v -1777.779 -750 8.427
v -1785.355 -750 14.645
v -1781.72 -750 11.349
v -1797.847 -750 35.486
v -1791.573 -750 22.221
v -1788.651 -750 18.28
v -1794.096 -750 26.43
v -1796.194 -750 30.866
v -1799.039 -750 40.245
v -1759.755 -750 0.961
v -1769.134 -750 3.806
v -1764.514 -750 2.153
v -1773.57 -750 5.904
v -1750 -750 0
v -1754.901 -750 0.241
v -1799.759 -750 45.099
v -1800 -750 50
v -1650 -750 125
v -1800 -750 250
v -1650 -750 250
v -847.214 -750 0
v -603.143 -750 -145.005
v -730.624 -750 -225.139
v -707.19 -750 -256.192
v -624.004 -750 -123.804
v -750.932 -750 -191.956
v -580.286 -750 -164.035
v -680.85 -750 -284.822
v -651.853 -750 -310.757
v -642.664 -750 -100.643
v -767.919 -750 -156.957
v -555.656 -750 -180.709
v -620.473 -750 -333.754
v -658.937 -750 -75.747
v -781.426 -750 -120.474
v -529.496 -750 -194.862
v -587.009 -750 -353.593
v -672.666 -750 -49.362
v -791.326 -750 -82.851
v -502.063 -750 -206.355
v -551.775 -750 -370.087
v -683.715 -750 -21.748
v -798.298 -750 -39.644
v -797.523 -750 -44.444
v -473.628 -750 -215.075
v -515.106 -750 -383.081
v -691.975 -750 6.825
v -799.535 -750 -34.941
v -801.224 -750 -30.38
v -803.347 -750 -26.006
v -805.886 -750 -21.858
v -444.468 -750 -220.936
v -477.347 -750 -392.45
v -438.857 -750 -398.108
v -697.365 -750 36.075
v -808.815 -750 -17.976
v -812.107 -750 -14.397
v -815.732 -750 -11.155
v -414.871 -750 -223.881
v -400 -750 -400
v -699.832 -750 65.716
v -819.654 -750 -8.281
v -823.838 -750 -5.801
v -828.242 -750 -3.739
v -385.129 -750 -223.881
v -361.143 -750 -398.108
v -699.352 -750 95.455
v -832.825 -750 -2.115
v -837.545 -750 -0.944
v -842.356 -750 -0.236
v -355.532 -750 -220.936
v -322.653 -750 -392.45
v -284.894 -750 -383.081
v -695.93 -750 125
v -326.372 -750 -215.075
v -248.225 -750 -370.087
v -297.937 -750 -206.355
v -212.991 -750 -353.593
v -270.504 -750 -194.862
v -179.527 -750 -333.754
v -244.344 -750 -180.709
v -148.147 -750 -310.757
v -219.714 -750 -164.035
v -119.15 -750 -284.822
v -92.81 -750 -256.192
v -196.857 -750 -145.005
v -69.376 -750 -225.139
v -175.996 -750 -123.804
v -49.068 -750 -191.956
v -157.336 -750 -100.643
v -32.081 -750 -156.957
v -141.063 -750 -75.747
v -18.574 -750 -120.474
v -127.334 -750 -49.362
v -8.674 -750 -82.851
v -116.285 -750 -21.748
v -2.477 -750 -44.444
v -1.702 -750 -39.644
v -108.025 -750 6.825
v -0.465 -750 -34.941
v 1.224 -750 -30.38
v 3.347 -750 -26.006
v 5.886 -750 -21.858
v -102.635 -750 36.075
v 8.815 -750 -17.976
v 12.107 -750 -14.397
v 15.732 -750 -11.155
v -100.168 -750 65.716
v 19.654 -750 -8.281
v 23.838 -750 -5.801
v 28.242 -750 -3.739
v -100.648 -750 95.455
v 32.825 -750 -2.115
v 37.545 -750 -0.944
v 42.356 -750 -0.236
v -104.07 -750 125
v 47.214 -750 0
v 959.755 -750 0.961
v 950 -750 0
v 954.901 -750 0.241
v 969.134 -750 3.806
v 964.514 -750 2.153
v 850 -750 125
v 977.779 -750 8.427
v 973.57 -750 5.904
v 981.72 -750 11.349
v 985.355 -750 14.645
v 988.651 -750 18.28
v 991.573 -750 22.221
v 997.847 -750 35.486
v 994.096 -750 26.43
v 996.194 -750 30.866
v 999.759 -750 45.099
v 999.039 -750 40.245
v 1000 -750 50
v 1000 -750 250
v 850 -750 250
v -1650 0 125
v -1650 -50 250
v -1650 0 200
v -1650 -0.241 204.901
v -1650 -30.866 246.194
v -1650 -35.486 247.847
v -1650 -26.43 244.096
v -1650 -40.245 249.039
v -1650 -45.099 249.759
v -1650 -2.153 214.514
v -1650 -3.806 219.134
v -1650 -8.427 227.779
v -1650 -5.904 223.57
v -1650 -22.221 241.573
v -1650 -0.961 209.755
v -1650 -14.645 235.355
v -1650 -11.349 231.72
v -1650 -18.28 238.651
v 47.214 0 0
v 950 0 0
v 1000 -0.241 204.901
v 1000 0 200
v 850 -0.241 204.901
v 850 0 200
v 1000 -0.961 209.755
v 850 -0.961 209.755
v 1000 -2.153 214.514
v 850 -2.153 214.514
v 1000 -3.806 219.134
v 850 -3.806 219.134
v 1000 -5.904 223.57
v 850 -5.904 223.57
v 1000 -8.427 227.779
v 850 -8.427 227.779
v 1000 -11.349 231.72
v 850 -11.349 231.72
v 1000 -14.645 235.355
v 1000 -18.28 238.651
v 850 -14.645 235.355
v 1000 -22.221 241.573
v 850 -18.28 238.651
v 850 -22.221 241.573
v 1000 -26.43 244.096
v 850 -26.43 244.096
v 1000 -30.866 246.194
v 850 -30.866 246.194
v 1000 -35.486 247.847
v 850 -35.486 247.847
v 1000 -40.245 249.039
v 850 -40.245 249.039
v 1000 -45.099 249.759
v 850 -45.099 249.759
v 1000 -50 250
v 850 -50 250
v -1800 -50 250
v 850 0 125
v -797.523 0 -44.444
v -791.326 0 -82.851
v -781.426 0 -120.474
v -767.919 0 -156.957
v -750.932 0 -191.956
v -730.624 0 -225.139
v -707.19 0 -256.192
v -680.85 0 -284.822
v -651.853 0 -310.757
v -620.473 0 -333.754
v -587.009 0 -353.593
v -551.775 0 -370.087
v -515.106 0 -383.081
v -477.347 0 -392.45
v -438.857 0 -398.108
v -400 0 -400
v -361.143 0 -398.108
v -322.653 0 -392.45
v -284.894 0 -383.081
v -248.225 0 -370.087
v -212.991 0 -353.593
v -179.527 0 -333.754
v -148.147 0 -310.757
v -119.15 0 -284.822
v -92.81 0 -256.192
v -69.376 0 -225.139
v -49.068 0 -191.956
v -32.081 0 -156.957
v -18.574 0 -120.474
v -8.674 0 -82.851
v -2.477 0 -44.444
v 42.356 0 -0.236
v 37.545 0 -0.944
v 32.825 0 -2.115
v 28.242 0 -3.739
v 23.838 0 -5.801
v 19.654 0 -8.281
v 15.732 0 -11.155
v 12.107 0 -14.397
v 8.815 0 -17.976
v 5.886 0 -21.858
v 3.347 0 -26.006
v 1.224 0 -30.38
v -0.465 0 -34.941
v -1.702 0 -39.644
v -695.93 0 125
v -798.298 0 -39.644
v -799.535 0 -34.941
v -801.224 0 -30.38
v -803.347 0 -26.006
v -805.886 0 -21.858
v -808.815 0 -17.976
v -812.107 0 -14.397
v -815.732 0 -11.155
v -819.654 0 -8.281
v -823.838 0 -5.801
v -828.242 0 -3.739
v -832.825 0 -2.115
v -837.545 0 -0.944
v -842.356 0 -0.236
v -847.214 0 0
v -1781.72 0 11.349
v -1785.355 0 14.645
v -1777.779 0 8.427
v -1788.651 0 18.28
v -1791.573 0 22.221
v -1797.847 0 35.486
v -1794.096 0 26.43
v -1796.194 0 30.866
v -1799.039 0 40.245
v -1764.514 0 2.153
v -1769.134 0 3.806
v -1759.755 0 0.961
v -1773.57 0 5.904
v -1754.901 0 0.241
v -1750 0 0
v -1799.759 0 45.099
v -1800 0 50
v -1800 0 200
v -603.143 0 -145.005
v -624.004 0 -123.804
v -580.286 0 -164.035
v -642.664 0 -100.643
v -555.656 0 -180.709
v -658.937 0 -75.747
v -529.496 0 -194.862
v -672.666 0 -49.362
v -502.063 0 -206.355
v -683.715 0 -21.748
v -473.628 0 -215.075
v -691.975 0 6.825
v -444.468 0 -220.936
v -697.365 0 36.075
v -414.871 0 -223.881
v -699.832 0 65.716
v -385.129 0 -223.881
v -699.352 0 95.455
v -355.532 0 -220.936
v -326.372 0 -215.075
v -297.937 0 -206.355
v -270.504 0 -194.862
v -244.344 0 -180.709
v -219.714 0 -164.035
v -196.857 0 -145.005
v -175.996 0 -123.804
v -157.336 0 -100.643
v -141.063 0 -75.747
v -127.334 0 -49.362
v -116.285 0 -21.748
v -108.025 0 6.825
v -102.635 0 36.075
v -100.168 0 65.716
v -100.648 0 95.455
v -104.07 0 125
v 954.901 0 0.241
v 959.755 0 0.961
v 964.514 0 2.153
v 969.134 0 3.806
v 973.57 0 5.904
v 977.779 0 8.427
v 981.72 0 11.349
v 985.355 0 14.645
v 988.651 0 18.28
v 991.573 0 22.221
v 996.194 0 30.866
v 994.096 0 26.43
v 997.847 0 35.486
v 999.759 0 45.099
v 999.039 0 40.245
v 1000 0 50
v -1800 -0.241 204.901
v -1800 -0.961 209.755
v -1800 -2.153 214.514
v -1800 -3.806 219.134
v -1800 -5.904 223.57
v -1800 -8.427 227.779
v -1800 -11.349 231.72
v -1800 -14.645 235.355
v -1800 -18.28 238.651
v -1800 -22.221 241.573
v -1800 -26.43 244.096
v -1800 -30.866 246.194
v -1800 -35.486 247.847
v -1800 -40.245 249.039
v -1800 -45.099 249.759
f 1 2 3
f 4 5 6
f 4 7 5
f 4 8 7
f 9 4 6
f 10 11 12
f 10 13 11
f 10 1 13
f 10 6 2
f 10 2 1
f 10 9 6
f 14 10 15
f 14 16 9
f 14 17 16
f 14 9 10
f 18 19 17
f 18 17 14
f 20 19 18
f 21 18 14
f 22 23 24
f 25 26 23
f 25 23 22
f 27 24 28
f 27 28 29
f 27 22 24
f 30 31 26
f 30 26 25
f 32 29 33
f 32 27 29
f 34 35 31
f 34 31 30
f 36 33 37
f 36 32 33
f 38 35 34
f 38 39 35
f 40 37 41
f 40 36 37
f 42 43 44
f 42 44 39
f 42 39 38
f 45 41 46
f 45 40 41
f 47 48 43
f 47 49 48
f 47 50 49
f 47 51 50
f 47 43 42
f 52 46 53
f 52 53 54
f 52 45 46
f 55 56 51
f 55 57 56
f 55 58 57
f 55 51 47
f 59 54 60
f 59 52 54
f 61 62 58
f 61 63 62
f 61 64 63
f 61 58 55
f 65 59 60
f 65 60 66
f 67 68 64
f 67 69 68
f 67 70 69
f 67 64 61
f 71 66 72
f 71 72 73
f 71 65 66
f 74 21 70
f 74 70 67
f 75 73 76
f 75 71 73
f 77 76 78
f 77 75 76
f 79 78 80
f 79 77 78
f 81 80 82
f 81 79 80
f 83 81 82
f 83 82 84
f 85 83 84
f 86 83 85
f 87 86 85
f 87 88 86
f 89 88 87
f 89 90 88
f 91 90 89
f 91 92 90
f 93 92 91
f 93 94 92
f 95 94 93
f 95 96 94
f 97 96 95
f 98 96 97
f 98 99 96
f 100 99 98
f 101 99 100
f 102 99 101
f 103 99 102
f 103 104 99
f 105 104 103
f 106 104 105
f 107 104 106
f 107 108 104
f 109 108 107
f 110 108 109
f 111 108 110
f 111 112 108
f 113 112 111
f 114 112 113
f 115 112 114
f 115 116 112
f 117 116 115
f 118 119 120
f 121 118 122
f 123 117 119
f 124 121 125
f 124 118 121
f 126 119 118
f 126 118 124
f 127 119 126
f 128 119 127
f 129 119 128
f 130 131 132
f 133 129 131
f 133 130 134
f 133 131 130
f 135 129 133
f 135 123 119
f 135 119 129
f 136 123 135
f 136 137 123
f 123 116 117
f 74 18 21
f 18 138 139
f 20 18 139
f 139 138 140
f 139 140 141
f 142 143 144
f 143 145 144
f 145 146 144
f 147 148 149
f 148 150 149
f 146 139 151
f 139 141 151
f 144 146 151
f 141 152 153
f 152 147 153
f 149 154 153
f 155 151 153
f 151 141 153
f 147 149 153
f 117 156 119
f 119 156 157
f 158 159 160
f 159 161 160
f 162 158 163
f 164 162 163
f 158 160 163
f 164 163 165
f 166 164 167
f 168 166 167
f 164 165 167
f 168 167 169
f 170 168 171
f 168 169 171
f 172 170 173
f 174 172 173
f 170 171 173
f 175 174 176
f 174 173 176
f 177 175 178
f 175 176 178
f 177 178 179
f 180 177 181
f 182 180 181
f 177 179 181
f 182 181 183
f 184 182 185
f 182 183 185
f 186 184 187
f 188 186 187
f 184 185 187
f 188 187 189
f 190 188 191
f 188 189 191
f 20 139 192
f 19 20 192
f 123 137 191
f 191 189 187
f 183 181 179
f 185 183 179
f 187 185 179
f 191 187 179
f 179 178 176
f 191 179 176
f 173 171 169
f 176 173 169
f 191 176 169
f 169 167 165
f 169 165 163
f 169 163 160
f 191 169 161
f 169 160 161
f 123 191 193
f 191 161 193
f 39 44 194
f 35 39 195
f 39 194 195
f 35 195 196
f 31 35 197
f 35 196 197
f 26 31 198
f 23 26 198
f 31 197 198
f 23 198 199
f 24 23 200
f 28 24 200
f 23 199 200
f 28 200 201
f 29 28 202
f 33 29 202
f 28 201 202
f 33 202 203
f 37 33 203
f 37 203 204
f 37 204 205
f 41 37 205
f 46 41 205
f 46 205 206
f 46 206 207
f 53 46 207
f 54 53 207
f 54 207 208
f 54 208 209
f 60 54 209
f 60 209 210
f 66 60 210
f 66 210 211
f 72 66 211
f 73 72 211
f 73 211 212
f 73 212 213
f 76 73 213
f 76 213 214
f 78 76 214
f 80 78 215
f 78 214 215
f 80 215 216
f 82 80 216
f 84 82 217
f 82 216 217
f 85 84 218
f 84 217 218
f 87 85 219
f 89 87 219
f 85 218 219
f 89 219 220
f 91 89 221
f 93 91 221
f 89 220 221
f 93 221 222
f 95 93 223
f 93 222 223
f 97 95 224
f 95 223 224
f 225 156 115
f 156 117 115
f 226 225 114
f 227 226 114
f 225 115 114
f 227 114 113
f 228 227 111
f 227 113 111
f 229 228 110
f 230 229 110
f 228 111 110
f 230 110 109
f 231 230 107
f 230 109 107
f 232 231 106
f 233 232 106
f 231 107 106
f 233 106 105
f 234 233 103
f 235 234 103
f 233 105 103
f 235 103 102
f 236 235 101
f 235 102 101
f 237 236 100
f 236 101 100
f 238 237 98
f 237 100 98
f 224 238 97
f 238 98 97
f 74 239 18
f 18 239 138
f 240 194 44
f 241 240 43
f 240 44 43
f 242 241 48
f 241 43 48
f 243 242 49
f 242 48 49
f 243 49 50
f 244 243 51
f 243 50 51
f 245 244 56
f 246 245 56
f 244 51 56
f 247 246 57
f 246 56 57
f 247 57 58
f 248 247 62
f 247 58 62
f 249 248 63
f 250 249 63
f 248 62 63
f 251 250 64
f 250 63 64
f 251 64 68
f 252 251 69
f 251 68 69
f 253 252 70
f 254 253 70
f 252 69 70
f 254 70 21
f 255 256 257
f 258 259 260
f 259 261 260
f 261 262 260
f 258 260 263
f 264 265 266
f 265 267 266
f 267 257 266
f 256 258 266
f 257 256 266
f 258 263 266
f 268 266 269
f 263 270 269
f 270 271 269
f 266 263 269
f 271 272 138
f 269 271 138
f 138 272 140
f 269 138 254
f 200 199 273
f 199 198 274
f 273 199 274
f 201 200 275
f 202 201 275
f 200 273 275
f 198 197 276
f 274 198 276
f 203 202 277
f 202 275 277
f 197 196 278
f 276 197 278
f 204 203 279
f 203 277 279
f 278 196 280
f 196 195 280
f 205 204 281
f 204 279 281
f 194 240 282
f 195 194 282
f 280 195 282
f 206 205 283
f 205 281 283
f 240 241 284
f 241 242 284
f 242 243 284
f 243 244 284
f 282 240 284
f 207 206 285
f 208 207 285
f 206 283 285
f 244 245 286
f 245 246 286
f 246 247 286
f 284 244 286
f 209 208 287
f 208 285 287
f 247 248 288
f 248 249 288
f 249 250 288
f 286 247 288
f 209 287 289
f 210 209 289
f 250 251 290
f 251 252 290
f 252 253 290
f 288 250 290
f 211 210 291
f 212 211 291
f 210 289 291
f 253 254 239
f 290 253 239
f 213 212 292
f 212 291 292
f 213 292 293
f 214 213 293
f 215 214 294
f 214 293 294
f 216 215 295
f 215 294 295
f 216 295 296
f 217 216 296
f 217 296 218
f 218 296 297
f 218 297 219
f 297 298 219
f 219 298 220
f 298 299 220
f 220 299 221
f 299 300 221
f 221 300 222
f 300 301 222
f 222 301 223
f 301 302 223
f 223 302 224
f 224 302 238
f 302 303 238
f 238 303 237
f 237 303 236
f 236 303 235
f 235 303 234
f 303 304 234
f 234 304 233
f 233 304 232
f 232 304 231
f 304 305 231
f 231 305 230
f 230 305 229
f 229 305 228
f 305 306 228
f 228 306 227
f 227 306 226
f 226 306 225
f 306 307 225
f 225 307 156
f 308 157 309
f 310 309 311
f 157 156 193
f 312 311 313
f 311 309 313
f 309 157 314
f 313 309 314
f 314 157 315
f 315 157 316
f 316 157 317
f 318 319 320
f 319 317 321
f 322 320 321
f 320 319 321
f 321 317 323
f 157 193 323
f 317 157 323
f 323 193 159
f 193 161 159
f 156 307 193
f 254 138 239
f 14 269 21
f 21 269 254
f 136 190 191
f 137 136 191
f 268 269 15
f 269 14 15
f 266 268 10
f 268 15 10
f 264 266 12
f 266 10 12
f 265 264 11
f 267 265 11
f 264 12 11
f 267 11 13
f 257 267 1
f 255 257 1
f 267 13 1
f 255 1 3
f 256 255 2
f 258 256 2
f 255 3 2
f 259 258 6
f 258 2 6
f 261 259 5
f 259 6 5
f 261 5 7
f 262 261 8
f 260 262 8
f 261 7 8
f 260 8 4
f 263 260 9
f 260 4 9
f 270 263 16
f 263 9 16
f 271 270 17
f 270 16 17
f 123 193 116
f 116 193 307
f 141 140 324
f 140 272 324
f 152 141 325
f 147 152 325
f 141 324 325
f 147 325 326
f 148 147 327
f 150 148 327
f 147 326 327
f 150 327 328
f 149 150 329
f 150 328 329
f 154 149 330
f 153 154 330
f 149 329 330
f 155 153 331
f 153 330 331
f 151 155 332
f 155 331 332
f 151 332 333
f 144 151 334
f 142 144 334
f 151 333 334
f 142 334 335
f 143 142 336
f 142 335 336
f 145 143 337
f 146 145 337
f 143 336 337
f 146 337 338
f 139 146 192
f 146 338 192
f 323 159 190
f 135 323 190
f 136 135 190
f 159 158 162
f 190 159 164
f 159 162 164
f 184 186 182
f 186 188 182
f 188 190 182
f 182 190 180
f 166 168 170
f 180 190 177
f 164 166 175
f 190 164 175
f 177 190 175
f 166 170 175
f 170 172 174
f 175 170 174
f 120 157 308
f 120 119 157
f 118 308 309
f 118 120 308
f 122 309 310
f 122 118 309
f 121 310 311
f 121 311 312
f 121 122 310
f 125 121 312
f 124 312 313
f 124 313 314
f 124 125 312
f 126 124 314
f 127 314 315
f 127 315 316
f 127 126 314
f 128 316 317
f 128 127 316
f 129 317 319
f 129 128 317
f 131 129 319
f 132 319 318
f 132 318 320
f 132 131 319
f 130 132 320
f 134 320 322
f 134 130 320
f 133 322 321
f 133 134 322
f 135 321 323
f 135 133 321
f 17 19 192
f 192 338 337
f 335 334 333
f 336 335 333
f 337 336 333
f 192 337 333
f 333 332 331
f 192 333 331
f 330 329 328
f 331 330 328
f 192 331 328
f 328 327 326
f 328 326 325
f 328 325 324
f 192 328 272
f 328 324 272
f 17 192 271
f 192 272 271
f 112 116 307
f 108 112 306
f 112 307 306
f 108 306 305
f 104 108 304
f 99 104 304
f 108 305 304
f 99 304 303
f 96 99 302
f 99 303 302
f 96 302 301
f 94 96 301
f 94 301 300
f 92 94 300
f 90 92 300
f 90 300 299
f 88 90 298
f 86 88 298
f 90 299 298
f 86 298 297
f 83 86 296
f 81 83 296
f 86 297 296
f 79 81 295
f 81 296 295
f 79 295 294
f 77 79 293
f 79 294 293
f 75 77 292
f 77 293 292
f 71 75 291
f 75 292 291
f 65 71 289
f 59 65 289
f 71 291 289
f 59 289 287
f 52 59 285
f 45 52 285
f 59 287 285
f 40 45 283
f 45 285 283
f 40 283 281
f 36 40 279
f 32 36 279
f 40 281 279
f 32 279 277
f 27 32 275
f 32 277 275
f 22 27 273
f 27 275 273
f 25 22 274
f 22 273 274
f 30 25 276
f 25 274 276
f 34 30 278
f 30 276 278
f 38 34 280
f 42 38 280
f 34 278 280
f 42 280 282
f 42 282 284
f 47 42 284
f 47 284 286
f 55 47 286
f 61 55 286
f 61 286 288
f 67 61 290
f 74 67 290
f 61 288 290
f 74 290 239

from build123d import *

# Parameters (mm, degrees)
F1_DEPTH = 750
F2_R     = 50
F3_R     = 50
F4_R     = 50
F5_R     = 50
F6_R     = 50


with BuildPart() as f1:
    # F0 (on Front) → F1 (new body)
    with BuildSketch(Plane.XZ):
        with BuildLine():
            ThreePointArc((-800, 0), (-400, -400), (0, 0))
            Line((0, 0), (1000, 0))
            Line((1000, 0), (1000, 250))
            Line((1000, 250), (850, 250))
            Line((850, 250), (850, 125))
            Line((850, 125), (-104.070191, 125))
            ThreePointArc((-104.070191, 125), (-400, -224.249854), (-695.929809, 125))
            Line((-695.929809, 125), (-1650, 125))
            Line((-1650, 125), (-1650, 250))
            Line((-1650, 250), (-1800, 250))
            Line((-1800, 250), (-1800, 0))
            Line((-1800, 0), (-800, 0))
        make_face()
    extrude(amount=F1_DEPTH)

    # F2
    f2_edges = [f1.edges().sort_by_distance(p)[0] for p in [
        (1000, -375, 0),
    ]]
    fillet(f2_edges, radius=F2_R)

    # F3
    f3_edges = [f1.edges().sort_by_distance(p)[0] for p in [
        (925, 0, 250),
    ]]
    fillet(f3_edges, radius=F3_R)

    # F4
    f4_edges = [f1.edges().sort_by_distance(p)[0] for p in [
        (0, -375, 0),
    ]]
    fillet(f4_edges, radius=F4_R)

    # F5
    f5_edges = [f1.edges().sort_by_distance(p)[0] for p in [
        (-800, -375, 0),
    ]]
    fillet(f5_edges, radius=F5_R)

    # F6
    f6_edges = [f1.edges().sort_by_distance(p)[0] for p in [
        (-1800, -375, 0),
        (-1725, 0, 250),
    ]]
    fillet(f6_edges, radius=F6_R)


solid = f1.part
